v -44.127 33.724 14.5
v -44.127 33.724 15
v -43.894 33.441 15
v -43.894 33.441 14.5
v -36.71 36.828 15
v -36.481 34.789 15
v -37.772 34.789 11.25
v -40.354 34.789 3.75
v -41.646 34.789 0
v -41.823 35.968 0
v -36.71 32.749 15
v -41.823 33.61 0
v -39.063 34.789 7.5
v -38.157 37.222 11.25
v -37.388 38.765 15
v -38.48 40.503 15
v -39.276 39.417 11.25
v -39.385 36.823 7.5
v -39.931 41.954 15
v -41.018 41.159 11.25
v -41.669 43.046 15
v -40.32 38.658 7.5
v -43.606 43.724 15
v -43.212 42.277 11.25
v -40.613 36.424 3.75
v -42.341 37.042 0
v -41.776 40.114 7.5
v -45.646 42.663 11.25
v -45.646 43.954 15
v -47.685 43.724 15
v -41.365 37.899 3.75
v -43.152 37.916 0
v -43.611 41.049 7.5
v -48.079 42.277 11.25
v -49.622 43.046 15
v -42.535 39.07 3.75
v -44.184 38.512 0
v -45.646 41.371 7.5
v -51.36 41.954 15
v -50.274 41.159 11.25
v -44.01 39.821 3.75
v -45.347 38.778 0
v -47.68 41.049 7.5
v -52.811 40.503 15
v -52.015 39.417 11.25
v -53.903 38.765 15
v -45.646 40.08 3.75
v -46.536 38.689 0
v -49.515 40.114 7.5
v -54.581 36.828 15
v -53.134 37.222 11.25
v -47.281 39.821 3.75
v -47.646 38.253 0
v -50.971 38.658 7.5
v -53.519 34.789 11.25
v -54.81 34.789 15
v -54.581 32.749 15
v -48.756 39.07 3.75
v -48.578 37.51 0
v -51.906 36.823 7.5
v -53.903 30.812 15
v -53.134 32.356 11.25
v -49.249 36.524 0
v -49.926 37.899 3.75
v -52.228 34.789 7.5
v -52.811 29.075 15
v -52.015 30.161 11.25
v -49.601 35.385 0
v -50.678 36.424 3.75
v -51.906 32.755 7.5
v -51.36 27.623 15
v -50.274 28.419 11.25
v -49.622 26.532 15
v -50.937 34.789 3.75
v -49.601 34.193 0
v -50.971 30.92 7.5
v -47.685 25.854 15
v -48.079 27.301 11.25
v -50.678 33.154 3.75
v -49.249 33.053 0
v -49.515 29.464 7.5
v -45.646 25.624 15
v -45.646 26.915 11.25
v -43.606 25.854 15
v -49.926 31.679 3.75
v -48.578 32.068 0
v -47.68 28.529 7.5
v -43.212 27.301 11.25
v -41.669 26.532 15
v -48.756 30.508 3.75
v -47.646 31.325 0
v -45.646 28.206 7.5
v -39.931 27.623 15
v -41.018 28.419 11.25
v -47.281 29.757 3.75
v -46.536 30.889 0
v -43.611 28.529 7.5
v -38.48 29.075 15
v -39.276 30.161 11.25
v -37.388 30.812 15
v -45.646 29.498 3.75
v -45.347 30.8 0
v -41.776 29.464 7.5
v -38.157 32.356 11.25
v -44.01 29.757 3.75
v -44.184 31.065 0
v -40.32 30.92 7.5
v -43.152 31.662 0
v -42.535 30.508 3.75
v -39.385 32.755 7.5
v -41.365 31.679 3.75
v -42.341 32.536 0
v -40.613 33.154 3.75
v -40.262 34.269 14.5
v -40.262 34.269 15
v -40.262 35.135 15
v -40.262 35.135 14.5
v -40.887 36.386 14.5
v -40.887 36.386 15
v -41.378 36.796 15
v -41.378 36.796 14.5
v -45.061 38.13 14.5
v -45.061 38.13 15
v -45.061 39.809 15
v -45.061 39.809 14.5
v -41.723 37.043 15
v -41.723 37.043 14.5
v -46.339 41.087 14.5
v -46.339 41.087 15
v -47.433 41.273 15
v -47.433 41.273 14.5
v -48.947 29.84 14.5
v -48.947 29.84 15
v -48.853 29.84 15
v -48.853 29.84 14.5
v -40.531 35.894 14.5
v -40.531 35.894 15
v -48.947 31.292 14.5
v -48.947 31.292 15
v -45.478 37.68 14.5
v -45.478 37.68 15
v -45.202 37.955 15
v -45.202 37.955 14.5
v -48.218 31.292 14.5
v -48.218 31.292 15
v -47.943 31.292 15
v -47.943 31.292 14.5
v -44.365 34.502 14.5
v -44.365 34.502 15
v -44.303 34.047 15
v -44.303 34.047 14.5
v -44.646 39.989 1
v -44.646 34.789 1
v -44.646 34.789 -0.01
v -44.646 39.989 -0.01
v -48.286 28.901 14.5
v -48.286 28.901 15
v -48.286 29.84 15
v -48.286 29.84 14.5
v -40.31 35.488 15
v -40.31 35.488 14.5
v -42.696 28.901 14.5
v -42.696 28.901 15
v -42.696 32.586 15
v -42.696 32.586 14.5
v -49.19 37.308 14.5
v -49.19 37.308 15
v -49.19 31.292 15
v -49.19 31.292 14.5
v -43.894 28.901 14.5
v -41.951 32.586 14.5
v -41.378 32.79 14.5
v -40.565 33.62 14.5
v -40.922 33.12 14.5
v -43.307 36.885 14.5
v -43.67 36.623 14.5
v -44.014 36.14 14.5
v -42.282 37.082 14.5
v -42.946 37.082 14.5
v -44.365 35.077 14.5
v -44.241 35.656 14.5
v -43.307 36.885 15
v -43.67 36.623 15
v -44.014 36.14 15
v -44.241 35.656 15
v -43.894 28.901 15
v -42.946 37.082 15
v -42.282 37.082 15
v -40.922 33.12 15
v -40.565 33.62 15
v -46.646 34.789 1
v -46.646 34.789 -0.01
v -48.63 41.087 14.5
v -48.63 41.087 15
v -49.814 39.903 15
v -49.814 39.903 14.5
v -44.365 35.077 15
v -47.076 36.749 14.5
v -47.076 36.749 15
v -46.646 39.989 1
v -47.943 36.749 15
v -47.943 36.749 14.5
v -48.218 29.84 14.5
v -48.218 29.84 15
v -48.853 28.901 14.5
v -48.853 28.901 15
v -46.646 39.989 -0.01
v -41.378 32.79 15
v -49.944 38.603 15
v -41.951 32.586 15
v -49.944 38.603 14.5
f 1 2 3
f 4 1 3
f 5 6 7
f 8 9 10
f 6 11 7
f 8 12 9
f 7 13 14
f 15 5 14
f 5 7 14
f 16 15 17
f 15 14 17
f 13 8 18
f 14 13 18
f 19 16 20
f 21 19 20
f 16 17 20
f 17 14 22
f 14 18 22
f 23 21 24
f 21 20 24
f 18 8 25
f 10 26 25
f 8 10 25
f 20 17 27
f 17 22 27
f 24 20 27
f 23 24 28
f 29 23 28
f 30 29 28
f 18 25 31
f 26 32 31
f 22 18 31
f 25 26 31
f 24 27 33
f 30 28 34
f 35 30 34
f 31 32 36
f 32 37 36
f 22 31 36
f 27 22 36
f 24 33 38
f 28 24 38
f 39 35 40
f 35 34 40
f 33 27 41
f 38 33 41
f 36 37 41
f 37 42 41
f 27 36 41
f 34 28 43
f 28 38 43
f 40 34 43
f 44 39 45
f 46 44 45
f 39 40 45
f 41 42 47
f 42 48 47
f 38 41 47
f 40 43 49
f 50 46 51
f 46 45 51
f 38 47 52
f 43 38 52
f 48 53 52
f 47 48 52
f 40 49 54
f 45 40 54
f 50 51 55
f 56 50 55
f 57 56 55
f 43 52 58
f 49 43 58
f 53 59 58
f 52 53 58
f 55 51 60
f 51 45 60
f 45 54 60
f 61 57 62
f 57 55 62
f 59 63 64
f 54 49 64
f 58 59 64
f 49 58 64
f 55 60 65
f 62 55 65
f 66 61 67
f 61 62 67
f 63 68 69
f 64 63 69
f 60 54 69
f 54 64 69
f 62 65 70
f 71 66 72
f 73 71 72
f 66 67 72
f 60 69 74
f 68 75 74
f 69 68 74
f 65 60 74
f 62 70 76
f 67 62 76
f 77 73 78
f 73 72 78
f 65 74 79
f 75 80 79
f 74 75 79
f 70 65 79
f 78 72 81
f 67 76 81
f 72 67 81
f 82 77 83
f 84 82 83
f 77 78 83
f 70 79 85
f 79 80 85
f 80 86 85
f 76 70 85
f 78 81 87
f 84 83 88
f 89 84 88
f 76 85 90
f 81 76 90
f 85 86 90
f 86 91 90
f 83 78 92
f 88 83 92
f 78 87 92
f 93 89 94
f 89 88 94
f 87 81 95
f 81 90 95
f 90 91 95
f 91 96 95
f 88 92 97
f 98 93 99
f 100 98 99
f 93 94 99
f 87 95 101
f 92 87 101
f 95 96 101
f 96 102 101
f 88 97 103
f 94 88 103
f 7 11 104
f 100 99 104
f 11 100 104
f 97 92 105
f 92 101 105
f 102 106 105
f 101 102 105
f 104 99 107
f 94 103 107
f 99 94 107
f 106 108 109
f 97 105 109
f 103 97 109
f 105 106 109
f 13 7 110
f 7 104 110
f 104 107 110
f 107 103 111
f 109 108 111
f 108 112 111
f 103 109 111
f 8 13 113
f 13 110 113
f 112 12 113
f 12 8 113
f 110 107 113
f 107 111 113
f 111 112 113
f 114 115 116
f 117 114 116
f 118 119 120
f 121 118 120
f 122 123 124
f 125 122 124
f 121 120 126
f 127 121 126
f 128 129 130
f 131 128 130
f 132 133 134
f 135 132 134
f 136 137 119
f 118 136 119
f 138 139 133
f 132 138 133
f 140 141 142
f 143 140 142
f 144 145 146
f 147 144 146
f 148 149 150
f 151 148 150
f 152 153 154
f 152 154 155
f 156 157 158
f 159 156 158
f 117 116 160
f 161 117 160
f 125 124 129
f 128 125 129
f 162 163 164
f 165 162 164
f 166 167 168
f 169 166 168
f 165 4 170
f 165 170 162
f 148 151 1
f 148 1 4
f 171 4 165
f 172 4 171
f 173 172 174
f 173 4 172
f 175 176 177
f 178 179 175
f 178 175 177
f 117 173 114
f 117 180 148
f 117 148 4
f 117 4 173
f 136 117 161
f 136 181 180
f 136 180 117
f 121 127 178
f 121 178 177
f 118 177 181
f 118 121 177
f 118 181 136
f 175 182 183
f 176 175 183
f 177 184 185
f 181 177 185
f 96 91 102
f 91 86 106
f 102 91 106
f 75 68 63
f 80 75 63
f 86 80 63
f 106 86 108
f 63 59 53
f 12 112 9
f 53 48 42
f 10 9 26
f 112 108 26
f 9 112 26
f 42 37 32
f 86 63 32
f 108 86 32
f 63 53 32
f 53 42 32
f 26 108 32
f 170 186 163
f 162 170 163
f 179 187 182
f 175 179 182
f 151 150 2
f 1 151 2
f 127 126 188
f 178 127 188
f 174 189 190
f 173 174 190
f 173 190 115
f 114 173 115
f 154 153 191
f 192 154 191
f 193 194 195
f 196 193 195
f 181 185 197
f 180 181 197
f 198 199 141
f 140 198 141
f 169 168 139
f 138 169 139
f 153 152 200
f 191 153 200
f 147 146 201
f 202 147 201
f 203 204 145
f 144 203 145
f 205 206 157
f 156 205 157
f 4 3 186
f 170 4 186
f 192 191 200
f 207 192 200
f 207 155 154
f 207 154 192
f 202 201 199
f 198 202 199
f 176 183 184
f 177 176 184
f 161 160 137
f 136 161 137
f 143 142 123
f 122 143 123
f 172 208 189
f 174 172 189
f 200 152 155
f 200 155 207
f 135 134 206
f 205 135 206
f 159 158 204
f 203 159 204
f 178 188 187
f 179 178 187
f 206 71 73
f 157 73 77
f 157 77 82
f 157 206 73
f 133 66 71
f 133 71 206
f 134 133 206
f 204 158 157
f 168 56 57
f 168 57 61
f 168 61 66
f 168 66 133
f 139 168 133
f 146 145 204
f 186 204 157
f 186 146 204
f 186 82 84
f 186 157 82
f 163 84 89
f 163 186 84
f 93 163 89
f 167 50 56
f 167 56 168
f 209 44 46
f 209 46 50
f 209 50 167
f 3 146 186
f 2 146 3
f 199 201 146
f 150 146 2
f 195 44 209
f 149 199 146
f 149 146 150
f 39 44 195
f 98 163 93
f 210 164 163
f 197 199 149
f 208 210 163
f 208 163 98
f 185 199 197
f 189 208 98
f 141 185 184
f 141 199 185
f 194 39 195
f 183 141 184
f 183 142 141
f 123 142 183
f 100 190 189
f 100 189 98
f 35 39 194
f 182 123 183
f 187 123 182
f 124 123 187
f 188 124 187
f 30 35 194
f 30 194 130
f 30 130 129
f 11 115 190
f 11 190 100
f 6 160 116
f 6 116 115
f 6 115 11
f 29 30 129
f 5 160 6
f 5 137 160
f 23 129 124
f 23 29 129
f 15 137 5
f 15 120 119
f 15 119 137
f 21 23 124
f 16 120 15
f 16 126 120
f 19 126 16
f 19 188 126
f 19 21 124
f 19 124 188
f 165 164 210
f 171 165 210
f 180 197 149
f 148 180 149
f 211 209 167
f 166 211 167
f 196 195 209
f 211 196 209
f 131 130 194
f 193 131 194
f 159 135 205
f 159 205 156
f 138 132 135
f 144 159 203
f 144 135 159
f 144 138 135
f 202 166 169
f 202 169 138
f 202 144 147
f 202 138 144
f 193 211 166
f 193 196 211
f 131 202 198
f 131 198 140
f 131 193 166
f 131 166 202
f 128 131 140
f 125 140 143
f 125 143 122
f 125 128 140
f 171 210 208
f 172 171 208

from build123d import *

# Parameters (mm, degrees)
ESQUISSE1_R             = 4
BOSS_EXTRU_1_DEPTH      = 15
BOSS_EXTRU_1_DRAFT      = -19
BOSS_EXTRU_2_DEPTH      = 0.01
BOSS_EXTRU_2_DEPTH_BACK = 1
ESQUISSE2_W             = 2
ESQUISSE2_H             = 5.2
ENL_V_MAT_EXTRU_2_DEPTH = 0.5


with BuildPart() as part:
    # Esquisse1 → Boss.-Extru.1 (with draft: the straight prism first)
    with BuildSketch(Plane.XY):
        with Locations((-45.645547355, 34.788865837)):
            Circle(ESQUISSE1_R)
    extrude(amount=BOSS_EXTRU_1_DEPTH)
    # Boss.-Extru.1: the draft: its side faces are tilted about the plane it starts from
    boss_extru_1_sides = [part.faces().sort_by_distance(p)[0] for p in [
        (-49.645547355, 34.788865837, 7.5),
    ]]
    draft(boss_extru_1_sides, Plane.XY, BOSS_EXTRU_1_DRAFT)

    # Esquisse4 → Enlèv. mat.-Extru.2 (cut)
    with BuildSketch(Plane.XY.offset(15)):
        Polygon((-49.943995821, 38.603153257), (-49.189604531, 37.307830652), (-49.189604531, 31.291720416), (-48.946969311, 31.291720416), (-48.946969311, 29.839834395), (-48.853477913, 29.839834395), (-48.853477913, 28.901020834), (-48.286038565, 28.901020834), (-48.286038565, 29.839834395), (-48.218416226, 29.839834395), (-48.218416226, 31.291720416), (-47.943149859, 31.291720416), (-47.943149859, 36.748991058), (-47.075851086, 36.748991058), (-45.477923282, 37.679618542), (-45.202049869, 37.955491955), (-45.061274623, 38.130390425), (-45.061274623, 39.80899134), (-46.339472035, 41.087188751), (-47.432529213, 41.272727647), (-48.630268638, 41.087188751), (-49.814003652, 39.903453737), align=None)
        Polygon((-42.696072341, 28.901020834), (-42.696072341, 32.586123938), (-41.951495344, 32.586123938), (-41.37816481, 32.790044364), (-40.922152429, 33.120204937), (-40.565248273, 33.620161984), (-40.261777364, 34.268608239), (-40.261777364, 35.135148566), (-40.310005521, 35.488432157), (-40.530692657, 35.894061573), (-40.887092257, 36.386314868), (-41.37816481, 36.796394376), (-41.723349738, 37.042811415), (-42.282245323, 37.081943025), (-42.945535048, 37.081943025), (-43.307086562, 36.885236956), (-43.669608606, 36.622764946), (-44.014105478, 36.140188221), (-44.240513356, 35.656407614), (-44.364881332, 35.076877066), (-44.364881332, 34.5020846), (-44.302697344, 34.04657098), (-44.127309417, 33.724202835), (-43.893548402, 33.440965737), (-43.893548402, 28.901020834), align=None)
    extrude(amount=-ENL_V_MAT_EXTRU_2_DEPTH, mode=Mode.SUBTRACT)


with BuildPart() as body_2:
    # Esquisse2 → Boss.-Extru.2 (new, two sides: drawn at the far end of the back side and taken through both)
    with BuildSketch(Plane(origin=(0, 0, 0), x_dir=(-1, 0, 0), z_dir=(0, 0, -1)).offset(-BOSS_EXTRU_2_DEPTH_BACK)):
        with Locations((45.645547355, 37.388865837)):
            Rectangle(ESQUISSE2_W, ESQUISSE2_H)
    extrude(amount=BOSS_EXTRU_2_DEPTH + BOSS_EXTRU_2_DEPTH_BACK)


solid = Compound([part.part, body_2.part])
